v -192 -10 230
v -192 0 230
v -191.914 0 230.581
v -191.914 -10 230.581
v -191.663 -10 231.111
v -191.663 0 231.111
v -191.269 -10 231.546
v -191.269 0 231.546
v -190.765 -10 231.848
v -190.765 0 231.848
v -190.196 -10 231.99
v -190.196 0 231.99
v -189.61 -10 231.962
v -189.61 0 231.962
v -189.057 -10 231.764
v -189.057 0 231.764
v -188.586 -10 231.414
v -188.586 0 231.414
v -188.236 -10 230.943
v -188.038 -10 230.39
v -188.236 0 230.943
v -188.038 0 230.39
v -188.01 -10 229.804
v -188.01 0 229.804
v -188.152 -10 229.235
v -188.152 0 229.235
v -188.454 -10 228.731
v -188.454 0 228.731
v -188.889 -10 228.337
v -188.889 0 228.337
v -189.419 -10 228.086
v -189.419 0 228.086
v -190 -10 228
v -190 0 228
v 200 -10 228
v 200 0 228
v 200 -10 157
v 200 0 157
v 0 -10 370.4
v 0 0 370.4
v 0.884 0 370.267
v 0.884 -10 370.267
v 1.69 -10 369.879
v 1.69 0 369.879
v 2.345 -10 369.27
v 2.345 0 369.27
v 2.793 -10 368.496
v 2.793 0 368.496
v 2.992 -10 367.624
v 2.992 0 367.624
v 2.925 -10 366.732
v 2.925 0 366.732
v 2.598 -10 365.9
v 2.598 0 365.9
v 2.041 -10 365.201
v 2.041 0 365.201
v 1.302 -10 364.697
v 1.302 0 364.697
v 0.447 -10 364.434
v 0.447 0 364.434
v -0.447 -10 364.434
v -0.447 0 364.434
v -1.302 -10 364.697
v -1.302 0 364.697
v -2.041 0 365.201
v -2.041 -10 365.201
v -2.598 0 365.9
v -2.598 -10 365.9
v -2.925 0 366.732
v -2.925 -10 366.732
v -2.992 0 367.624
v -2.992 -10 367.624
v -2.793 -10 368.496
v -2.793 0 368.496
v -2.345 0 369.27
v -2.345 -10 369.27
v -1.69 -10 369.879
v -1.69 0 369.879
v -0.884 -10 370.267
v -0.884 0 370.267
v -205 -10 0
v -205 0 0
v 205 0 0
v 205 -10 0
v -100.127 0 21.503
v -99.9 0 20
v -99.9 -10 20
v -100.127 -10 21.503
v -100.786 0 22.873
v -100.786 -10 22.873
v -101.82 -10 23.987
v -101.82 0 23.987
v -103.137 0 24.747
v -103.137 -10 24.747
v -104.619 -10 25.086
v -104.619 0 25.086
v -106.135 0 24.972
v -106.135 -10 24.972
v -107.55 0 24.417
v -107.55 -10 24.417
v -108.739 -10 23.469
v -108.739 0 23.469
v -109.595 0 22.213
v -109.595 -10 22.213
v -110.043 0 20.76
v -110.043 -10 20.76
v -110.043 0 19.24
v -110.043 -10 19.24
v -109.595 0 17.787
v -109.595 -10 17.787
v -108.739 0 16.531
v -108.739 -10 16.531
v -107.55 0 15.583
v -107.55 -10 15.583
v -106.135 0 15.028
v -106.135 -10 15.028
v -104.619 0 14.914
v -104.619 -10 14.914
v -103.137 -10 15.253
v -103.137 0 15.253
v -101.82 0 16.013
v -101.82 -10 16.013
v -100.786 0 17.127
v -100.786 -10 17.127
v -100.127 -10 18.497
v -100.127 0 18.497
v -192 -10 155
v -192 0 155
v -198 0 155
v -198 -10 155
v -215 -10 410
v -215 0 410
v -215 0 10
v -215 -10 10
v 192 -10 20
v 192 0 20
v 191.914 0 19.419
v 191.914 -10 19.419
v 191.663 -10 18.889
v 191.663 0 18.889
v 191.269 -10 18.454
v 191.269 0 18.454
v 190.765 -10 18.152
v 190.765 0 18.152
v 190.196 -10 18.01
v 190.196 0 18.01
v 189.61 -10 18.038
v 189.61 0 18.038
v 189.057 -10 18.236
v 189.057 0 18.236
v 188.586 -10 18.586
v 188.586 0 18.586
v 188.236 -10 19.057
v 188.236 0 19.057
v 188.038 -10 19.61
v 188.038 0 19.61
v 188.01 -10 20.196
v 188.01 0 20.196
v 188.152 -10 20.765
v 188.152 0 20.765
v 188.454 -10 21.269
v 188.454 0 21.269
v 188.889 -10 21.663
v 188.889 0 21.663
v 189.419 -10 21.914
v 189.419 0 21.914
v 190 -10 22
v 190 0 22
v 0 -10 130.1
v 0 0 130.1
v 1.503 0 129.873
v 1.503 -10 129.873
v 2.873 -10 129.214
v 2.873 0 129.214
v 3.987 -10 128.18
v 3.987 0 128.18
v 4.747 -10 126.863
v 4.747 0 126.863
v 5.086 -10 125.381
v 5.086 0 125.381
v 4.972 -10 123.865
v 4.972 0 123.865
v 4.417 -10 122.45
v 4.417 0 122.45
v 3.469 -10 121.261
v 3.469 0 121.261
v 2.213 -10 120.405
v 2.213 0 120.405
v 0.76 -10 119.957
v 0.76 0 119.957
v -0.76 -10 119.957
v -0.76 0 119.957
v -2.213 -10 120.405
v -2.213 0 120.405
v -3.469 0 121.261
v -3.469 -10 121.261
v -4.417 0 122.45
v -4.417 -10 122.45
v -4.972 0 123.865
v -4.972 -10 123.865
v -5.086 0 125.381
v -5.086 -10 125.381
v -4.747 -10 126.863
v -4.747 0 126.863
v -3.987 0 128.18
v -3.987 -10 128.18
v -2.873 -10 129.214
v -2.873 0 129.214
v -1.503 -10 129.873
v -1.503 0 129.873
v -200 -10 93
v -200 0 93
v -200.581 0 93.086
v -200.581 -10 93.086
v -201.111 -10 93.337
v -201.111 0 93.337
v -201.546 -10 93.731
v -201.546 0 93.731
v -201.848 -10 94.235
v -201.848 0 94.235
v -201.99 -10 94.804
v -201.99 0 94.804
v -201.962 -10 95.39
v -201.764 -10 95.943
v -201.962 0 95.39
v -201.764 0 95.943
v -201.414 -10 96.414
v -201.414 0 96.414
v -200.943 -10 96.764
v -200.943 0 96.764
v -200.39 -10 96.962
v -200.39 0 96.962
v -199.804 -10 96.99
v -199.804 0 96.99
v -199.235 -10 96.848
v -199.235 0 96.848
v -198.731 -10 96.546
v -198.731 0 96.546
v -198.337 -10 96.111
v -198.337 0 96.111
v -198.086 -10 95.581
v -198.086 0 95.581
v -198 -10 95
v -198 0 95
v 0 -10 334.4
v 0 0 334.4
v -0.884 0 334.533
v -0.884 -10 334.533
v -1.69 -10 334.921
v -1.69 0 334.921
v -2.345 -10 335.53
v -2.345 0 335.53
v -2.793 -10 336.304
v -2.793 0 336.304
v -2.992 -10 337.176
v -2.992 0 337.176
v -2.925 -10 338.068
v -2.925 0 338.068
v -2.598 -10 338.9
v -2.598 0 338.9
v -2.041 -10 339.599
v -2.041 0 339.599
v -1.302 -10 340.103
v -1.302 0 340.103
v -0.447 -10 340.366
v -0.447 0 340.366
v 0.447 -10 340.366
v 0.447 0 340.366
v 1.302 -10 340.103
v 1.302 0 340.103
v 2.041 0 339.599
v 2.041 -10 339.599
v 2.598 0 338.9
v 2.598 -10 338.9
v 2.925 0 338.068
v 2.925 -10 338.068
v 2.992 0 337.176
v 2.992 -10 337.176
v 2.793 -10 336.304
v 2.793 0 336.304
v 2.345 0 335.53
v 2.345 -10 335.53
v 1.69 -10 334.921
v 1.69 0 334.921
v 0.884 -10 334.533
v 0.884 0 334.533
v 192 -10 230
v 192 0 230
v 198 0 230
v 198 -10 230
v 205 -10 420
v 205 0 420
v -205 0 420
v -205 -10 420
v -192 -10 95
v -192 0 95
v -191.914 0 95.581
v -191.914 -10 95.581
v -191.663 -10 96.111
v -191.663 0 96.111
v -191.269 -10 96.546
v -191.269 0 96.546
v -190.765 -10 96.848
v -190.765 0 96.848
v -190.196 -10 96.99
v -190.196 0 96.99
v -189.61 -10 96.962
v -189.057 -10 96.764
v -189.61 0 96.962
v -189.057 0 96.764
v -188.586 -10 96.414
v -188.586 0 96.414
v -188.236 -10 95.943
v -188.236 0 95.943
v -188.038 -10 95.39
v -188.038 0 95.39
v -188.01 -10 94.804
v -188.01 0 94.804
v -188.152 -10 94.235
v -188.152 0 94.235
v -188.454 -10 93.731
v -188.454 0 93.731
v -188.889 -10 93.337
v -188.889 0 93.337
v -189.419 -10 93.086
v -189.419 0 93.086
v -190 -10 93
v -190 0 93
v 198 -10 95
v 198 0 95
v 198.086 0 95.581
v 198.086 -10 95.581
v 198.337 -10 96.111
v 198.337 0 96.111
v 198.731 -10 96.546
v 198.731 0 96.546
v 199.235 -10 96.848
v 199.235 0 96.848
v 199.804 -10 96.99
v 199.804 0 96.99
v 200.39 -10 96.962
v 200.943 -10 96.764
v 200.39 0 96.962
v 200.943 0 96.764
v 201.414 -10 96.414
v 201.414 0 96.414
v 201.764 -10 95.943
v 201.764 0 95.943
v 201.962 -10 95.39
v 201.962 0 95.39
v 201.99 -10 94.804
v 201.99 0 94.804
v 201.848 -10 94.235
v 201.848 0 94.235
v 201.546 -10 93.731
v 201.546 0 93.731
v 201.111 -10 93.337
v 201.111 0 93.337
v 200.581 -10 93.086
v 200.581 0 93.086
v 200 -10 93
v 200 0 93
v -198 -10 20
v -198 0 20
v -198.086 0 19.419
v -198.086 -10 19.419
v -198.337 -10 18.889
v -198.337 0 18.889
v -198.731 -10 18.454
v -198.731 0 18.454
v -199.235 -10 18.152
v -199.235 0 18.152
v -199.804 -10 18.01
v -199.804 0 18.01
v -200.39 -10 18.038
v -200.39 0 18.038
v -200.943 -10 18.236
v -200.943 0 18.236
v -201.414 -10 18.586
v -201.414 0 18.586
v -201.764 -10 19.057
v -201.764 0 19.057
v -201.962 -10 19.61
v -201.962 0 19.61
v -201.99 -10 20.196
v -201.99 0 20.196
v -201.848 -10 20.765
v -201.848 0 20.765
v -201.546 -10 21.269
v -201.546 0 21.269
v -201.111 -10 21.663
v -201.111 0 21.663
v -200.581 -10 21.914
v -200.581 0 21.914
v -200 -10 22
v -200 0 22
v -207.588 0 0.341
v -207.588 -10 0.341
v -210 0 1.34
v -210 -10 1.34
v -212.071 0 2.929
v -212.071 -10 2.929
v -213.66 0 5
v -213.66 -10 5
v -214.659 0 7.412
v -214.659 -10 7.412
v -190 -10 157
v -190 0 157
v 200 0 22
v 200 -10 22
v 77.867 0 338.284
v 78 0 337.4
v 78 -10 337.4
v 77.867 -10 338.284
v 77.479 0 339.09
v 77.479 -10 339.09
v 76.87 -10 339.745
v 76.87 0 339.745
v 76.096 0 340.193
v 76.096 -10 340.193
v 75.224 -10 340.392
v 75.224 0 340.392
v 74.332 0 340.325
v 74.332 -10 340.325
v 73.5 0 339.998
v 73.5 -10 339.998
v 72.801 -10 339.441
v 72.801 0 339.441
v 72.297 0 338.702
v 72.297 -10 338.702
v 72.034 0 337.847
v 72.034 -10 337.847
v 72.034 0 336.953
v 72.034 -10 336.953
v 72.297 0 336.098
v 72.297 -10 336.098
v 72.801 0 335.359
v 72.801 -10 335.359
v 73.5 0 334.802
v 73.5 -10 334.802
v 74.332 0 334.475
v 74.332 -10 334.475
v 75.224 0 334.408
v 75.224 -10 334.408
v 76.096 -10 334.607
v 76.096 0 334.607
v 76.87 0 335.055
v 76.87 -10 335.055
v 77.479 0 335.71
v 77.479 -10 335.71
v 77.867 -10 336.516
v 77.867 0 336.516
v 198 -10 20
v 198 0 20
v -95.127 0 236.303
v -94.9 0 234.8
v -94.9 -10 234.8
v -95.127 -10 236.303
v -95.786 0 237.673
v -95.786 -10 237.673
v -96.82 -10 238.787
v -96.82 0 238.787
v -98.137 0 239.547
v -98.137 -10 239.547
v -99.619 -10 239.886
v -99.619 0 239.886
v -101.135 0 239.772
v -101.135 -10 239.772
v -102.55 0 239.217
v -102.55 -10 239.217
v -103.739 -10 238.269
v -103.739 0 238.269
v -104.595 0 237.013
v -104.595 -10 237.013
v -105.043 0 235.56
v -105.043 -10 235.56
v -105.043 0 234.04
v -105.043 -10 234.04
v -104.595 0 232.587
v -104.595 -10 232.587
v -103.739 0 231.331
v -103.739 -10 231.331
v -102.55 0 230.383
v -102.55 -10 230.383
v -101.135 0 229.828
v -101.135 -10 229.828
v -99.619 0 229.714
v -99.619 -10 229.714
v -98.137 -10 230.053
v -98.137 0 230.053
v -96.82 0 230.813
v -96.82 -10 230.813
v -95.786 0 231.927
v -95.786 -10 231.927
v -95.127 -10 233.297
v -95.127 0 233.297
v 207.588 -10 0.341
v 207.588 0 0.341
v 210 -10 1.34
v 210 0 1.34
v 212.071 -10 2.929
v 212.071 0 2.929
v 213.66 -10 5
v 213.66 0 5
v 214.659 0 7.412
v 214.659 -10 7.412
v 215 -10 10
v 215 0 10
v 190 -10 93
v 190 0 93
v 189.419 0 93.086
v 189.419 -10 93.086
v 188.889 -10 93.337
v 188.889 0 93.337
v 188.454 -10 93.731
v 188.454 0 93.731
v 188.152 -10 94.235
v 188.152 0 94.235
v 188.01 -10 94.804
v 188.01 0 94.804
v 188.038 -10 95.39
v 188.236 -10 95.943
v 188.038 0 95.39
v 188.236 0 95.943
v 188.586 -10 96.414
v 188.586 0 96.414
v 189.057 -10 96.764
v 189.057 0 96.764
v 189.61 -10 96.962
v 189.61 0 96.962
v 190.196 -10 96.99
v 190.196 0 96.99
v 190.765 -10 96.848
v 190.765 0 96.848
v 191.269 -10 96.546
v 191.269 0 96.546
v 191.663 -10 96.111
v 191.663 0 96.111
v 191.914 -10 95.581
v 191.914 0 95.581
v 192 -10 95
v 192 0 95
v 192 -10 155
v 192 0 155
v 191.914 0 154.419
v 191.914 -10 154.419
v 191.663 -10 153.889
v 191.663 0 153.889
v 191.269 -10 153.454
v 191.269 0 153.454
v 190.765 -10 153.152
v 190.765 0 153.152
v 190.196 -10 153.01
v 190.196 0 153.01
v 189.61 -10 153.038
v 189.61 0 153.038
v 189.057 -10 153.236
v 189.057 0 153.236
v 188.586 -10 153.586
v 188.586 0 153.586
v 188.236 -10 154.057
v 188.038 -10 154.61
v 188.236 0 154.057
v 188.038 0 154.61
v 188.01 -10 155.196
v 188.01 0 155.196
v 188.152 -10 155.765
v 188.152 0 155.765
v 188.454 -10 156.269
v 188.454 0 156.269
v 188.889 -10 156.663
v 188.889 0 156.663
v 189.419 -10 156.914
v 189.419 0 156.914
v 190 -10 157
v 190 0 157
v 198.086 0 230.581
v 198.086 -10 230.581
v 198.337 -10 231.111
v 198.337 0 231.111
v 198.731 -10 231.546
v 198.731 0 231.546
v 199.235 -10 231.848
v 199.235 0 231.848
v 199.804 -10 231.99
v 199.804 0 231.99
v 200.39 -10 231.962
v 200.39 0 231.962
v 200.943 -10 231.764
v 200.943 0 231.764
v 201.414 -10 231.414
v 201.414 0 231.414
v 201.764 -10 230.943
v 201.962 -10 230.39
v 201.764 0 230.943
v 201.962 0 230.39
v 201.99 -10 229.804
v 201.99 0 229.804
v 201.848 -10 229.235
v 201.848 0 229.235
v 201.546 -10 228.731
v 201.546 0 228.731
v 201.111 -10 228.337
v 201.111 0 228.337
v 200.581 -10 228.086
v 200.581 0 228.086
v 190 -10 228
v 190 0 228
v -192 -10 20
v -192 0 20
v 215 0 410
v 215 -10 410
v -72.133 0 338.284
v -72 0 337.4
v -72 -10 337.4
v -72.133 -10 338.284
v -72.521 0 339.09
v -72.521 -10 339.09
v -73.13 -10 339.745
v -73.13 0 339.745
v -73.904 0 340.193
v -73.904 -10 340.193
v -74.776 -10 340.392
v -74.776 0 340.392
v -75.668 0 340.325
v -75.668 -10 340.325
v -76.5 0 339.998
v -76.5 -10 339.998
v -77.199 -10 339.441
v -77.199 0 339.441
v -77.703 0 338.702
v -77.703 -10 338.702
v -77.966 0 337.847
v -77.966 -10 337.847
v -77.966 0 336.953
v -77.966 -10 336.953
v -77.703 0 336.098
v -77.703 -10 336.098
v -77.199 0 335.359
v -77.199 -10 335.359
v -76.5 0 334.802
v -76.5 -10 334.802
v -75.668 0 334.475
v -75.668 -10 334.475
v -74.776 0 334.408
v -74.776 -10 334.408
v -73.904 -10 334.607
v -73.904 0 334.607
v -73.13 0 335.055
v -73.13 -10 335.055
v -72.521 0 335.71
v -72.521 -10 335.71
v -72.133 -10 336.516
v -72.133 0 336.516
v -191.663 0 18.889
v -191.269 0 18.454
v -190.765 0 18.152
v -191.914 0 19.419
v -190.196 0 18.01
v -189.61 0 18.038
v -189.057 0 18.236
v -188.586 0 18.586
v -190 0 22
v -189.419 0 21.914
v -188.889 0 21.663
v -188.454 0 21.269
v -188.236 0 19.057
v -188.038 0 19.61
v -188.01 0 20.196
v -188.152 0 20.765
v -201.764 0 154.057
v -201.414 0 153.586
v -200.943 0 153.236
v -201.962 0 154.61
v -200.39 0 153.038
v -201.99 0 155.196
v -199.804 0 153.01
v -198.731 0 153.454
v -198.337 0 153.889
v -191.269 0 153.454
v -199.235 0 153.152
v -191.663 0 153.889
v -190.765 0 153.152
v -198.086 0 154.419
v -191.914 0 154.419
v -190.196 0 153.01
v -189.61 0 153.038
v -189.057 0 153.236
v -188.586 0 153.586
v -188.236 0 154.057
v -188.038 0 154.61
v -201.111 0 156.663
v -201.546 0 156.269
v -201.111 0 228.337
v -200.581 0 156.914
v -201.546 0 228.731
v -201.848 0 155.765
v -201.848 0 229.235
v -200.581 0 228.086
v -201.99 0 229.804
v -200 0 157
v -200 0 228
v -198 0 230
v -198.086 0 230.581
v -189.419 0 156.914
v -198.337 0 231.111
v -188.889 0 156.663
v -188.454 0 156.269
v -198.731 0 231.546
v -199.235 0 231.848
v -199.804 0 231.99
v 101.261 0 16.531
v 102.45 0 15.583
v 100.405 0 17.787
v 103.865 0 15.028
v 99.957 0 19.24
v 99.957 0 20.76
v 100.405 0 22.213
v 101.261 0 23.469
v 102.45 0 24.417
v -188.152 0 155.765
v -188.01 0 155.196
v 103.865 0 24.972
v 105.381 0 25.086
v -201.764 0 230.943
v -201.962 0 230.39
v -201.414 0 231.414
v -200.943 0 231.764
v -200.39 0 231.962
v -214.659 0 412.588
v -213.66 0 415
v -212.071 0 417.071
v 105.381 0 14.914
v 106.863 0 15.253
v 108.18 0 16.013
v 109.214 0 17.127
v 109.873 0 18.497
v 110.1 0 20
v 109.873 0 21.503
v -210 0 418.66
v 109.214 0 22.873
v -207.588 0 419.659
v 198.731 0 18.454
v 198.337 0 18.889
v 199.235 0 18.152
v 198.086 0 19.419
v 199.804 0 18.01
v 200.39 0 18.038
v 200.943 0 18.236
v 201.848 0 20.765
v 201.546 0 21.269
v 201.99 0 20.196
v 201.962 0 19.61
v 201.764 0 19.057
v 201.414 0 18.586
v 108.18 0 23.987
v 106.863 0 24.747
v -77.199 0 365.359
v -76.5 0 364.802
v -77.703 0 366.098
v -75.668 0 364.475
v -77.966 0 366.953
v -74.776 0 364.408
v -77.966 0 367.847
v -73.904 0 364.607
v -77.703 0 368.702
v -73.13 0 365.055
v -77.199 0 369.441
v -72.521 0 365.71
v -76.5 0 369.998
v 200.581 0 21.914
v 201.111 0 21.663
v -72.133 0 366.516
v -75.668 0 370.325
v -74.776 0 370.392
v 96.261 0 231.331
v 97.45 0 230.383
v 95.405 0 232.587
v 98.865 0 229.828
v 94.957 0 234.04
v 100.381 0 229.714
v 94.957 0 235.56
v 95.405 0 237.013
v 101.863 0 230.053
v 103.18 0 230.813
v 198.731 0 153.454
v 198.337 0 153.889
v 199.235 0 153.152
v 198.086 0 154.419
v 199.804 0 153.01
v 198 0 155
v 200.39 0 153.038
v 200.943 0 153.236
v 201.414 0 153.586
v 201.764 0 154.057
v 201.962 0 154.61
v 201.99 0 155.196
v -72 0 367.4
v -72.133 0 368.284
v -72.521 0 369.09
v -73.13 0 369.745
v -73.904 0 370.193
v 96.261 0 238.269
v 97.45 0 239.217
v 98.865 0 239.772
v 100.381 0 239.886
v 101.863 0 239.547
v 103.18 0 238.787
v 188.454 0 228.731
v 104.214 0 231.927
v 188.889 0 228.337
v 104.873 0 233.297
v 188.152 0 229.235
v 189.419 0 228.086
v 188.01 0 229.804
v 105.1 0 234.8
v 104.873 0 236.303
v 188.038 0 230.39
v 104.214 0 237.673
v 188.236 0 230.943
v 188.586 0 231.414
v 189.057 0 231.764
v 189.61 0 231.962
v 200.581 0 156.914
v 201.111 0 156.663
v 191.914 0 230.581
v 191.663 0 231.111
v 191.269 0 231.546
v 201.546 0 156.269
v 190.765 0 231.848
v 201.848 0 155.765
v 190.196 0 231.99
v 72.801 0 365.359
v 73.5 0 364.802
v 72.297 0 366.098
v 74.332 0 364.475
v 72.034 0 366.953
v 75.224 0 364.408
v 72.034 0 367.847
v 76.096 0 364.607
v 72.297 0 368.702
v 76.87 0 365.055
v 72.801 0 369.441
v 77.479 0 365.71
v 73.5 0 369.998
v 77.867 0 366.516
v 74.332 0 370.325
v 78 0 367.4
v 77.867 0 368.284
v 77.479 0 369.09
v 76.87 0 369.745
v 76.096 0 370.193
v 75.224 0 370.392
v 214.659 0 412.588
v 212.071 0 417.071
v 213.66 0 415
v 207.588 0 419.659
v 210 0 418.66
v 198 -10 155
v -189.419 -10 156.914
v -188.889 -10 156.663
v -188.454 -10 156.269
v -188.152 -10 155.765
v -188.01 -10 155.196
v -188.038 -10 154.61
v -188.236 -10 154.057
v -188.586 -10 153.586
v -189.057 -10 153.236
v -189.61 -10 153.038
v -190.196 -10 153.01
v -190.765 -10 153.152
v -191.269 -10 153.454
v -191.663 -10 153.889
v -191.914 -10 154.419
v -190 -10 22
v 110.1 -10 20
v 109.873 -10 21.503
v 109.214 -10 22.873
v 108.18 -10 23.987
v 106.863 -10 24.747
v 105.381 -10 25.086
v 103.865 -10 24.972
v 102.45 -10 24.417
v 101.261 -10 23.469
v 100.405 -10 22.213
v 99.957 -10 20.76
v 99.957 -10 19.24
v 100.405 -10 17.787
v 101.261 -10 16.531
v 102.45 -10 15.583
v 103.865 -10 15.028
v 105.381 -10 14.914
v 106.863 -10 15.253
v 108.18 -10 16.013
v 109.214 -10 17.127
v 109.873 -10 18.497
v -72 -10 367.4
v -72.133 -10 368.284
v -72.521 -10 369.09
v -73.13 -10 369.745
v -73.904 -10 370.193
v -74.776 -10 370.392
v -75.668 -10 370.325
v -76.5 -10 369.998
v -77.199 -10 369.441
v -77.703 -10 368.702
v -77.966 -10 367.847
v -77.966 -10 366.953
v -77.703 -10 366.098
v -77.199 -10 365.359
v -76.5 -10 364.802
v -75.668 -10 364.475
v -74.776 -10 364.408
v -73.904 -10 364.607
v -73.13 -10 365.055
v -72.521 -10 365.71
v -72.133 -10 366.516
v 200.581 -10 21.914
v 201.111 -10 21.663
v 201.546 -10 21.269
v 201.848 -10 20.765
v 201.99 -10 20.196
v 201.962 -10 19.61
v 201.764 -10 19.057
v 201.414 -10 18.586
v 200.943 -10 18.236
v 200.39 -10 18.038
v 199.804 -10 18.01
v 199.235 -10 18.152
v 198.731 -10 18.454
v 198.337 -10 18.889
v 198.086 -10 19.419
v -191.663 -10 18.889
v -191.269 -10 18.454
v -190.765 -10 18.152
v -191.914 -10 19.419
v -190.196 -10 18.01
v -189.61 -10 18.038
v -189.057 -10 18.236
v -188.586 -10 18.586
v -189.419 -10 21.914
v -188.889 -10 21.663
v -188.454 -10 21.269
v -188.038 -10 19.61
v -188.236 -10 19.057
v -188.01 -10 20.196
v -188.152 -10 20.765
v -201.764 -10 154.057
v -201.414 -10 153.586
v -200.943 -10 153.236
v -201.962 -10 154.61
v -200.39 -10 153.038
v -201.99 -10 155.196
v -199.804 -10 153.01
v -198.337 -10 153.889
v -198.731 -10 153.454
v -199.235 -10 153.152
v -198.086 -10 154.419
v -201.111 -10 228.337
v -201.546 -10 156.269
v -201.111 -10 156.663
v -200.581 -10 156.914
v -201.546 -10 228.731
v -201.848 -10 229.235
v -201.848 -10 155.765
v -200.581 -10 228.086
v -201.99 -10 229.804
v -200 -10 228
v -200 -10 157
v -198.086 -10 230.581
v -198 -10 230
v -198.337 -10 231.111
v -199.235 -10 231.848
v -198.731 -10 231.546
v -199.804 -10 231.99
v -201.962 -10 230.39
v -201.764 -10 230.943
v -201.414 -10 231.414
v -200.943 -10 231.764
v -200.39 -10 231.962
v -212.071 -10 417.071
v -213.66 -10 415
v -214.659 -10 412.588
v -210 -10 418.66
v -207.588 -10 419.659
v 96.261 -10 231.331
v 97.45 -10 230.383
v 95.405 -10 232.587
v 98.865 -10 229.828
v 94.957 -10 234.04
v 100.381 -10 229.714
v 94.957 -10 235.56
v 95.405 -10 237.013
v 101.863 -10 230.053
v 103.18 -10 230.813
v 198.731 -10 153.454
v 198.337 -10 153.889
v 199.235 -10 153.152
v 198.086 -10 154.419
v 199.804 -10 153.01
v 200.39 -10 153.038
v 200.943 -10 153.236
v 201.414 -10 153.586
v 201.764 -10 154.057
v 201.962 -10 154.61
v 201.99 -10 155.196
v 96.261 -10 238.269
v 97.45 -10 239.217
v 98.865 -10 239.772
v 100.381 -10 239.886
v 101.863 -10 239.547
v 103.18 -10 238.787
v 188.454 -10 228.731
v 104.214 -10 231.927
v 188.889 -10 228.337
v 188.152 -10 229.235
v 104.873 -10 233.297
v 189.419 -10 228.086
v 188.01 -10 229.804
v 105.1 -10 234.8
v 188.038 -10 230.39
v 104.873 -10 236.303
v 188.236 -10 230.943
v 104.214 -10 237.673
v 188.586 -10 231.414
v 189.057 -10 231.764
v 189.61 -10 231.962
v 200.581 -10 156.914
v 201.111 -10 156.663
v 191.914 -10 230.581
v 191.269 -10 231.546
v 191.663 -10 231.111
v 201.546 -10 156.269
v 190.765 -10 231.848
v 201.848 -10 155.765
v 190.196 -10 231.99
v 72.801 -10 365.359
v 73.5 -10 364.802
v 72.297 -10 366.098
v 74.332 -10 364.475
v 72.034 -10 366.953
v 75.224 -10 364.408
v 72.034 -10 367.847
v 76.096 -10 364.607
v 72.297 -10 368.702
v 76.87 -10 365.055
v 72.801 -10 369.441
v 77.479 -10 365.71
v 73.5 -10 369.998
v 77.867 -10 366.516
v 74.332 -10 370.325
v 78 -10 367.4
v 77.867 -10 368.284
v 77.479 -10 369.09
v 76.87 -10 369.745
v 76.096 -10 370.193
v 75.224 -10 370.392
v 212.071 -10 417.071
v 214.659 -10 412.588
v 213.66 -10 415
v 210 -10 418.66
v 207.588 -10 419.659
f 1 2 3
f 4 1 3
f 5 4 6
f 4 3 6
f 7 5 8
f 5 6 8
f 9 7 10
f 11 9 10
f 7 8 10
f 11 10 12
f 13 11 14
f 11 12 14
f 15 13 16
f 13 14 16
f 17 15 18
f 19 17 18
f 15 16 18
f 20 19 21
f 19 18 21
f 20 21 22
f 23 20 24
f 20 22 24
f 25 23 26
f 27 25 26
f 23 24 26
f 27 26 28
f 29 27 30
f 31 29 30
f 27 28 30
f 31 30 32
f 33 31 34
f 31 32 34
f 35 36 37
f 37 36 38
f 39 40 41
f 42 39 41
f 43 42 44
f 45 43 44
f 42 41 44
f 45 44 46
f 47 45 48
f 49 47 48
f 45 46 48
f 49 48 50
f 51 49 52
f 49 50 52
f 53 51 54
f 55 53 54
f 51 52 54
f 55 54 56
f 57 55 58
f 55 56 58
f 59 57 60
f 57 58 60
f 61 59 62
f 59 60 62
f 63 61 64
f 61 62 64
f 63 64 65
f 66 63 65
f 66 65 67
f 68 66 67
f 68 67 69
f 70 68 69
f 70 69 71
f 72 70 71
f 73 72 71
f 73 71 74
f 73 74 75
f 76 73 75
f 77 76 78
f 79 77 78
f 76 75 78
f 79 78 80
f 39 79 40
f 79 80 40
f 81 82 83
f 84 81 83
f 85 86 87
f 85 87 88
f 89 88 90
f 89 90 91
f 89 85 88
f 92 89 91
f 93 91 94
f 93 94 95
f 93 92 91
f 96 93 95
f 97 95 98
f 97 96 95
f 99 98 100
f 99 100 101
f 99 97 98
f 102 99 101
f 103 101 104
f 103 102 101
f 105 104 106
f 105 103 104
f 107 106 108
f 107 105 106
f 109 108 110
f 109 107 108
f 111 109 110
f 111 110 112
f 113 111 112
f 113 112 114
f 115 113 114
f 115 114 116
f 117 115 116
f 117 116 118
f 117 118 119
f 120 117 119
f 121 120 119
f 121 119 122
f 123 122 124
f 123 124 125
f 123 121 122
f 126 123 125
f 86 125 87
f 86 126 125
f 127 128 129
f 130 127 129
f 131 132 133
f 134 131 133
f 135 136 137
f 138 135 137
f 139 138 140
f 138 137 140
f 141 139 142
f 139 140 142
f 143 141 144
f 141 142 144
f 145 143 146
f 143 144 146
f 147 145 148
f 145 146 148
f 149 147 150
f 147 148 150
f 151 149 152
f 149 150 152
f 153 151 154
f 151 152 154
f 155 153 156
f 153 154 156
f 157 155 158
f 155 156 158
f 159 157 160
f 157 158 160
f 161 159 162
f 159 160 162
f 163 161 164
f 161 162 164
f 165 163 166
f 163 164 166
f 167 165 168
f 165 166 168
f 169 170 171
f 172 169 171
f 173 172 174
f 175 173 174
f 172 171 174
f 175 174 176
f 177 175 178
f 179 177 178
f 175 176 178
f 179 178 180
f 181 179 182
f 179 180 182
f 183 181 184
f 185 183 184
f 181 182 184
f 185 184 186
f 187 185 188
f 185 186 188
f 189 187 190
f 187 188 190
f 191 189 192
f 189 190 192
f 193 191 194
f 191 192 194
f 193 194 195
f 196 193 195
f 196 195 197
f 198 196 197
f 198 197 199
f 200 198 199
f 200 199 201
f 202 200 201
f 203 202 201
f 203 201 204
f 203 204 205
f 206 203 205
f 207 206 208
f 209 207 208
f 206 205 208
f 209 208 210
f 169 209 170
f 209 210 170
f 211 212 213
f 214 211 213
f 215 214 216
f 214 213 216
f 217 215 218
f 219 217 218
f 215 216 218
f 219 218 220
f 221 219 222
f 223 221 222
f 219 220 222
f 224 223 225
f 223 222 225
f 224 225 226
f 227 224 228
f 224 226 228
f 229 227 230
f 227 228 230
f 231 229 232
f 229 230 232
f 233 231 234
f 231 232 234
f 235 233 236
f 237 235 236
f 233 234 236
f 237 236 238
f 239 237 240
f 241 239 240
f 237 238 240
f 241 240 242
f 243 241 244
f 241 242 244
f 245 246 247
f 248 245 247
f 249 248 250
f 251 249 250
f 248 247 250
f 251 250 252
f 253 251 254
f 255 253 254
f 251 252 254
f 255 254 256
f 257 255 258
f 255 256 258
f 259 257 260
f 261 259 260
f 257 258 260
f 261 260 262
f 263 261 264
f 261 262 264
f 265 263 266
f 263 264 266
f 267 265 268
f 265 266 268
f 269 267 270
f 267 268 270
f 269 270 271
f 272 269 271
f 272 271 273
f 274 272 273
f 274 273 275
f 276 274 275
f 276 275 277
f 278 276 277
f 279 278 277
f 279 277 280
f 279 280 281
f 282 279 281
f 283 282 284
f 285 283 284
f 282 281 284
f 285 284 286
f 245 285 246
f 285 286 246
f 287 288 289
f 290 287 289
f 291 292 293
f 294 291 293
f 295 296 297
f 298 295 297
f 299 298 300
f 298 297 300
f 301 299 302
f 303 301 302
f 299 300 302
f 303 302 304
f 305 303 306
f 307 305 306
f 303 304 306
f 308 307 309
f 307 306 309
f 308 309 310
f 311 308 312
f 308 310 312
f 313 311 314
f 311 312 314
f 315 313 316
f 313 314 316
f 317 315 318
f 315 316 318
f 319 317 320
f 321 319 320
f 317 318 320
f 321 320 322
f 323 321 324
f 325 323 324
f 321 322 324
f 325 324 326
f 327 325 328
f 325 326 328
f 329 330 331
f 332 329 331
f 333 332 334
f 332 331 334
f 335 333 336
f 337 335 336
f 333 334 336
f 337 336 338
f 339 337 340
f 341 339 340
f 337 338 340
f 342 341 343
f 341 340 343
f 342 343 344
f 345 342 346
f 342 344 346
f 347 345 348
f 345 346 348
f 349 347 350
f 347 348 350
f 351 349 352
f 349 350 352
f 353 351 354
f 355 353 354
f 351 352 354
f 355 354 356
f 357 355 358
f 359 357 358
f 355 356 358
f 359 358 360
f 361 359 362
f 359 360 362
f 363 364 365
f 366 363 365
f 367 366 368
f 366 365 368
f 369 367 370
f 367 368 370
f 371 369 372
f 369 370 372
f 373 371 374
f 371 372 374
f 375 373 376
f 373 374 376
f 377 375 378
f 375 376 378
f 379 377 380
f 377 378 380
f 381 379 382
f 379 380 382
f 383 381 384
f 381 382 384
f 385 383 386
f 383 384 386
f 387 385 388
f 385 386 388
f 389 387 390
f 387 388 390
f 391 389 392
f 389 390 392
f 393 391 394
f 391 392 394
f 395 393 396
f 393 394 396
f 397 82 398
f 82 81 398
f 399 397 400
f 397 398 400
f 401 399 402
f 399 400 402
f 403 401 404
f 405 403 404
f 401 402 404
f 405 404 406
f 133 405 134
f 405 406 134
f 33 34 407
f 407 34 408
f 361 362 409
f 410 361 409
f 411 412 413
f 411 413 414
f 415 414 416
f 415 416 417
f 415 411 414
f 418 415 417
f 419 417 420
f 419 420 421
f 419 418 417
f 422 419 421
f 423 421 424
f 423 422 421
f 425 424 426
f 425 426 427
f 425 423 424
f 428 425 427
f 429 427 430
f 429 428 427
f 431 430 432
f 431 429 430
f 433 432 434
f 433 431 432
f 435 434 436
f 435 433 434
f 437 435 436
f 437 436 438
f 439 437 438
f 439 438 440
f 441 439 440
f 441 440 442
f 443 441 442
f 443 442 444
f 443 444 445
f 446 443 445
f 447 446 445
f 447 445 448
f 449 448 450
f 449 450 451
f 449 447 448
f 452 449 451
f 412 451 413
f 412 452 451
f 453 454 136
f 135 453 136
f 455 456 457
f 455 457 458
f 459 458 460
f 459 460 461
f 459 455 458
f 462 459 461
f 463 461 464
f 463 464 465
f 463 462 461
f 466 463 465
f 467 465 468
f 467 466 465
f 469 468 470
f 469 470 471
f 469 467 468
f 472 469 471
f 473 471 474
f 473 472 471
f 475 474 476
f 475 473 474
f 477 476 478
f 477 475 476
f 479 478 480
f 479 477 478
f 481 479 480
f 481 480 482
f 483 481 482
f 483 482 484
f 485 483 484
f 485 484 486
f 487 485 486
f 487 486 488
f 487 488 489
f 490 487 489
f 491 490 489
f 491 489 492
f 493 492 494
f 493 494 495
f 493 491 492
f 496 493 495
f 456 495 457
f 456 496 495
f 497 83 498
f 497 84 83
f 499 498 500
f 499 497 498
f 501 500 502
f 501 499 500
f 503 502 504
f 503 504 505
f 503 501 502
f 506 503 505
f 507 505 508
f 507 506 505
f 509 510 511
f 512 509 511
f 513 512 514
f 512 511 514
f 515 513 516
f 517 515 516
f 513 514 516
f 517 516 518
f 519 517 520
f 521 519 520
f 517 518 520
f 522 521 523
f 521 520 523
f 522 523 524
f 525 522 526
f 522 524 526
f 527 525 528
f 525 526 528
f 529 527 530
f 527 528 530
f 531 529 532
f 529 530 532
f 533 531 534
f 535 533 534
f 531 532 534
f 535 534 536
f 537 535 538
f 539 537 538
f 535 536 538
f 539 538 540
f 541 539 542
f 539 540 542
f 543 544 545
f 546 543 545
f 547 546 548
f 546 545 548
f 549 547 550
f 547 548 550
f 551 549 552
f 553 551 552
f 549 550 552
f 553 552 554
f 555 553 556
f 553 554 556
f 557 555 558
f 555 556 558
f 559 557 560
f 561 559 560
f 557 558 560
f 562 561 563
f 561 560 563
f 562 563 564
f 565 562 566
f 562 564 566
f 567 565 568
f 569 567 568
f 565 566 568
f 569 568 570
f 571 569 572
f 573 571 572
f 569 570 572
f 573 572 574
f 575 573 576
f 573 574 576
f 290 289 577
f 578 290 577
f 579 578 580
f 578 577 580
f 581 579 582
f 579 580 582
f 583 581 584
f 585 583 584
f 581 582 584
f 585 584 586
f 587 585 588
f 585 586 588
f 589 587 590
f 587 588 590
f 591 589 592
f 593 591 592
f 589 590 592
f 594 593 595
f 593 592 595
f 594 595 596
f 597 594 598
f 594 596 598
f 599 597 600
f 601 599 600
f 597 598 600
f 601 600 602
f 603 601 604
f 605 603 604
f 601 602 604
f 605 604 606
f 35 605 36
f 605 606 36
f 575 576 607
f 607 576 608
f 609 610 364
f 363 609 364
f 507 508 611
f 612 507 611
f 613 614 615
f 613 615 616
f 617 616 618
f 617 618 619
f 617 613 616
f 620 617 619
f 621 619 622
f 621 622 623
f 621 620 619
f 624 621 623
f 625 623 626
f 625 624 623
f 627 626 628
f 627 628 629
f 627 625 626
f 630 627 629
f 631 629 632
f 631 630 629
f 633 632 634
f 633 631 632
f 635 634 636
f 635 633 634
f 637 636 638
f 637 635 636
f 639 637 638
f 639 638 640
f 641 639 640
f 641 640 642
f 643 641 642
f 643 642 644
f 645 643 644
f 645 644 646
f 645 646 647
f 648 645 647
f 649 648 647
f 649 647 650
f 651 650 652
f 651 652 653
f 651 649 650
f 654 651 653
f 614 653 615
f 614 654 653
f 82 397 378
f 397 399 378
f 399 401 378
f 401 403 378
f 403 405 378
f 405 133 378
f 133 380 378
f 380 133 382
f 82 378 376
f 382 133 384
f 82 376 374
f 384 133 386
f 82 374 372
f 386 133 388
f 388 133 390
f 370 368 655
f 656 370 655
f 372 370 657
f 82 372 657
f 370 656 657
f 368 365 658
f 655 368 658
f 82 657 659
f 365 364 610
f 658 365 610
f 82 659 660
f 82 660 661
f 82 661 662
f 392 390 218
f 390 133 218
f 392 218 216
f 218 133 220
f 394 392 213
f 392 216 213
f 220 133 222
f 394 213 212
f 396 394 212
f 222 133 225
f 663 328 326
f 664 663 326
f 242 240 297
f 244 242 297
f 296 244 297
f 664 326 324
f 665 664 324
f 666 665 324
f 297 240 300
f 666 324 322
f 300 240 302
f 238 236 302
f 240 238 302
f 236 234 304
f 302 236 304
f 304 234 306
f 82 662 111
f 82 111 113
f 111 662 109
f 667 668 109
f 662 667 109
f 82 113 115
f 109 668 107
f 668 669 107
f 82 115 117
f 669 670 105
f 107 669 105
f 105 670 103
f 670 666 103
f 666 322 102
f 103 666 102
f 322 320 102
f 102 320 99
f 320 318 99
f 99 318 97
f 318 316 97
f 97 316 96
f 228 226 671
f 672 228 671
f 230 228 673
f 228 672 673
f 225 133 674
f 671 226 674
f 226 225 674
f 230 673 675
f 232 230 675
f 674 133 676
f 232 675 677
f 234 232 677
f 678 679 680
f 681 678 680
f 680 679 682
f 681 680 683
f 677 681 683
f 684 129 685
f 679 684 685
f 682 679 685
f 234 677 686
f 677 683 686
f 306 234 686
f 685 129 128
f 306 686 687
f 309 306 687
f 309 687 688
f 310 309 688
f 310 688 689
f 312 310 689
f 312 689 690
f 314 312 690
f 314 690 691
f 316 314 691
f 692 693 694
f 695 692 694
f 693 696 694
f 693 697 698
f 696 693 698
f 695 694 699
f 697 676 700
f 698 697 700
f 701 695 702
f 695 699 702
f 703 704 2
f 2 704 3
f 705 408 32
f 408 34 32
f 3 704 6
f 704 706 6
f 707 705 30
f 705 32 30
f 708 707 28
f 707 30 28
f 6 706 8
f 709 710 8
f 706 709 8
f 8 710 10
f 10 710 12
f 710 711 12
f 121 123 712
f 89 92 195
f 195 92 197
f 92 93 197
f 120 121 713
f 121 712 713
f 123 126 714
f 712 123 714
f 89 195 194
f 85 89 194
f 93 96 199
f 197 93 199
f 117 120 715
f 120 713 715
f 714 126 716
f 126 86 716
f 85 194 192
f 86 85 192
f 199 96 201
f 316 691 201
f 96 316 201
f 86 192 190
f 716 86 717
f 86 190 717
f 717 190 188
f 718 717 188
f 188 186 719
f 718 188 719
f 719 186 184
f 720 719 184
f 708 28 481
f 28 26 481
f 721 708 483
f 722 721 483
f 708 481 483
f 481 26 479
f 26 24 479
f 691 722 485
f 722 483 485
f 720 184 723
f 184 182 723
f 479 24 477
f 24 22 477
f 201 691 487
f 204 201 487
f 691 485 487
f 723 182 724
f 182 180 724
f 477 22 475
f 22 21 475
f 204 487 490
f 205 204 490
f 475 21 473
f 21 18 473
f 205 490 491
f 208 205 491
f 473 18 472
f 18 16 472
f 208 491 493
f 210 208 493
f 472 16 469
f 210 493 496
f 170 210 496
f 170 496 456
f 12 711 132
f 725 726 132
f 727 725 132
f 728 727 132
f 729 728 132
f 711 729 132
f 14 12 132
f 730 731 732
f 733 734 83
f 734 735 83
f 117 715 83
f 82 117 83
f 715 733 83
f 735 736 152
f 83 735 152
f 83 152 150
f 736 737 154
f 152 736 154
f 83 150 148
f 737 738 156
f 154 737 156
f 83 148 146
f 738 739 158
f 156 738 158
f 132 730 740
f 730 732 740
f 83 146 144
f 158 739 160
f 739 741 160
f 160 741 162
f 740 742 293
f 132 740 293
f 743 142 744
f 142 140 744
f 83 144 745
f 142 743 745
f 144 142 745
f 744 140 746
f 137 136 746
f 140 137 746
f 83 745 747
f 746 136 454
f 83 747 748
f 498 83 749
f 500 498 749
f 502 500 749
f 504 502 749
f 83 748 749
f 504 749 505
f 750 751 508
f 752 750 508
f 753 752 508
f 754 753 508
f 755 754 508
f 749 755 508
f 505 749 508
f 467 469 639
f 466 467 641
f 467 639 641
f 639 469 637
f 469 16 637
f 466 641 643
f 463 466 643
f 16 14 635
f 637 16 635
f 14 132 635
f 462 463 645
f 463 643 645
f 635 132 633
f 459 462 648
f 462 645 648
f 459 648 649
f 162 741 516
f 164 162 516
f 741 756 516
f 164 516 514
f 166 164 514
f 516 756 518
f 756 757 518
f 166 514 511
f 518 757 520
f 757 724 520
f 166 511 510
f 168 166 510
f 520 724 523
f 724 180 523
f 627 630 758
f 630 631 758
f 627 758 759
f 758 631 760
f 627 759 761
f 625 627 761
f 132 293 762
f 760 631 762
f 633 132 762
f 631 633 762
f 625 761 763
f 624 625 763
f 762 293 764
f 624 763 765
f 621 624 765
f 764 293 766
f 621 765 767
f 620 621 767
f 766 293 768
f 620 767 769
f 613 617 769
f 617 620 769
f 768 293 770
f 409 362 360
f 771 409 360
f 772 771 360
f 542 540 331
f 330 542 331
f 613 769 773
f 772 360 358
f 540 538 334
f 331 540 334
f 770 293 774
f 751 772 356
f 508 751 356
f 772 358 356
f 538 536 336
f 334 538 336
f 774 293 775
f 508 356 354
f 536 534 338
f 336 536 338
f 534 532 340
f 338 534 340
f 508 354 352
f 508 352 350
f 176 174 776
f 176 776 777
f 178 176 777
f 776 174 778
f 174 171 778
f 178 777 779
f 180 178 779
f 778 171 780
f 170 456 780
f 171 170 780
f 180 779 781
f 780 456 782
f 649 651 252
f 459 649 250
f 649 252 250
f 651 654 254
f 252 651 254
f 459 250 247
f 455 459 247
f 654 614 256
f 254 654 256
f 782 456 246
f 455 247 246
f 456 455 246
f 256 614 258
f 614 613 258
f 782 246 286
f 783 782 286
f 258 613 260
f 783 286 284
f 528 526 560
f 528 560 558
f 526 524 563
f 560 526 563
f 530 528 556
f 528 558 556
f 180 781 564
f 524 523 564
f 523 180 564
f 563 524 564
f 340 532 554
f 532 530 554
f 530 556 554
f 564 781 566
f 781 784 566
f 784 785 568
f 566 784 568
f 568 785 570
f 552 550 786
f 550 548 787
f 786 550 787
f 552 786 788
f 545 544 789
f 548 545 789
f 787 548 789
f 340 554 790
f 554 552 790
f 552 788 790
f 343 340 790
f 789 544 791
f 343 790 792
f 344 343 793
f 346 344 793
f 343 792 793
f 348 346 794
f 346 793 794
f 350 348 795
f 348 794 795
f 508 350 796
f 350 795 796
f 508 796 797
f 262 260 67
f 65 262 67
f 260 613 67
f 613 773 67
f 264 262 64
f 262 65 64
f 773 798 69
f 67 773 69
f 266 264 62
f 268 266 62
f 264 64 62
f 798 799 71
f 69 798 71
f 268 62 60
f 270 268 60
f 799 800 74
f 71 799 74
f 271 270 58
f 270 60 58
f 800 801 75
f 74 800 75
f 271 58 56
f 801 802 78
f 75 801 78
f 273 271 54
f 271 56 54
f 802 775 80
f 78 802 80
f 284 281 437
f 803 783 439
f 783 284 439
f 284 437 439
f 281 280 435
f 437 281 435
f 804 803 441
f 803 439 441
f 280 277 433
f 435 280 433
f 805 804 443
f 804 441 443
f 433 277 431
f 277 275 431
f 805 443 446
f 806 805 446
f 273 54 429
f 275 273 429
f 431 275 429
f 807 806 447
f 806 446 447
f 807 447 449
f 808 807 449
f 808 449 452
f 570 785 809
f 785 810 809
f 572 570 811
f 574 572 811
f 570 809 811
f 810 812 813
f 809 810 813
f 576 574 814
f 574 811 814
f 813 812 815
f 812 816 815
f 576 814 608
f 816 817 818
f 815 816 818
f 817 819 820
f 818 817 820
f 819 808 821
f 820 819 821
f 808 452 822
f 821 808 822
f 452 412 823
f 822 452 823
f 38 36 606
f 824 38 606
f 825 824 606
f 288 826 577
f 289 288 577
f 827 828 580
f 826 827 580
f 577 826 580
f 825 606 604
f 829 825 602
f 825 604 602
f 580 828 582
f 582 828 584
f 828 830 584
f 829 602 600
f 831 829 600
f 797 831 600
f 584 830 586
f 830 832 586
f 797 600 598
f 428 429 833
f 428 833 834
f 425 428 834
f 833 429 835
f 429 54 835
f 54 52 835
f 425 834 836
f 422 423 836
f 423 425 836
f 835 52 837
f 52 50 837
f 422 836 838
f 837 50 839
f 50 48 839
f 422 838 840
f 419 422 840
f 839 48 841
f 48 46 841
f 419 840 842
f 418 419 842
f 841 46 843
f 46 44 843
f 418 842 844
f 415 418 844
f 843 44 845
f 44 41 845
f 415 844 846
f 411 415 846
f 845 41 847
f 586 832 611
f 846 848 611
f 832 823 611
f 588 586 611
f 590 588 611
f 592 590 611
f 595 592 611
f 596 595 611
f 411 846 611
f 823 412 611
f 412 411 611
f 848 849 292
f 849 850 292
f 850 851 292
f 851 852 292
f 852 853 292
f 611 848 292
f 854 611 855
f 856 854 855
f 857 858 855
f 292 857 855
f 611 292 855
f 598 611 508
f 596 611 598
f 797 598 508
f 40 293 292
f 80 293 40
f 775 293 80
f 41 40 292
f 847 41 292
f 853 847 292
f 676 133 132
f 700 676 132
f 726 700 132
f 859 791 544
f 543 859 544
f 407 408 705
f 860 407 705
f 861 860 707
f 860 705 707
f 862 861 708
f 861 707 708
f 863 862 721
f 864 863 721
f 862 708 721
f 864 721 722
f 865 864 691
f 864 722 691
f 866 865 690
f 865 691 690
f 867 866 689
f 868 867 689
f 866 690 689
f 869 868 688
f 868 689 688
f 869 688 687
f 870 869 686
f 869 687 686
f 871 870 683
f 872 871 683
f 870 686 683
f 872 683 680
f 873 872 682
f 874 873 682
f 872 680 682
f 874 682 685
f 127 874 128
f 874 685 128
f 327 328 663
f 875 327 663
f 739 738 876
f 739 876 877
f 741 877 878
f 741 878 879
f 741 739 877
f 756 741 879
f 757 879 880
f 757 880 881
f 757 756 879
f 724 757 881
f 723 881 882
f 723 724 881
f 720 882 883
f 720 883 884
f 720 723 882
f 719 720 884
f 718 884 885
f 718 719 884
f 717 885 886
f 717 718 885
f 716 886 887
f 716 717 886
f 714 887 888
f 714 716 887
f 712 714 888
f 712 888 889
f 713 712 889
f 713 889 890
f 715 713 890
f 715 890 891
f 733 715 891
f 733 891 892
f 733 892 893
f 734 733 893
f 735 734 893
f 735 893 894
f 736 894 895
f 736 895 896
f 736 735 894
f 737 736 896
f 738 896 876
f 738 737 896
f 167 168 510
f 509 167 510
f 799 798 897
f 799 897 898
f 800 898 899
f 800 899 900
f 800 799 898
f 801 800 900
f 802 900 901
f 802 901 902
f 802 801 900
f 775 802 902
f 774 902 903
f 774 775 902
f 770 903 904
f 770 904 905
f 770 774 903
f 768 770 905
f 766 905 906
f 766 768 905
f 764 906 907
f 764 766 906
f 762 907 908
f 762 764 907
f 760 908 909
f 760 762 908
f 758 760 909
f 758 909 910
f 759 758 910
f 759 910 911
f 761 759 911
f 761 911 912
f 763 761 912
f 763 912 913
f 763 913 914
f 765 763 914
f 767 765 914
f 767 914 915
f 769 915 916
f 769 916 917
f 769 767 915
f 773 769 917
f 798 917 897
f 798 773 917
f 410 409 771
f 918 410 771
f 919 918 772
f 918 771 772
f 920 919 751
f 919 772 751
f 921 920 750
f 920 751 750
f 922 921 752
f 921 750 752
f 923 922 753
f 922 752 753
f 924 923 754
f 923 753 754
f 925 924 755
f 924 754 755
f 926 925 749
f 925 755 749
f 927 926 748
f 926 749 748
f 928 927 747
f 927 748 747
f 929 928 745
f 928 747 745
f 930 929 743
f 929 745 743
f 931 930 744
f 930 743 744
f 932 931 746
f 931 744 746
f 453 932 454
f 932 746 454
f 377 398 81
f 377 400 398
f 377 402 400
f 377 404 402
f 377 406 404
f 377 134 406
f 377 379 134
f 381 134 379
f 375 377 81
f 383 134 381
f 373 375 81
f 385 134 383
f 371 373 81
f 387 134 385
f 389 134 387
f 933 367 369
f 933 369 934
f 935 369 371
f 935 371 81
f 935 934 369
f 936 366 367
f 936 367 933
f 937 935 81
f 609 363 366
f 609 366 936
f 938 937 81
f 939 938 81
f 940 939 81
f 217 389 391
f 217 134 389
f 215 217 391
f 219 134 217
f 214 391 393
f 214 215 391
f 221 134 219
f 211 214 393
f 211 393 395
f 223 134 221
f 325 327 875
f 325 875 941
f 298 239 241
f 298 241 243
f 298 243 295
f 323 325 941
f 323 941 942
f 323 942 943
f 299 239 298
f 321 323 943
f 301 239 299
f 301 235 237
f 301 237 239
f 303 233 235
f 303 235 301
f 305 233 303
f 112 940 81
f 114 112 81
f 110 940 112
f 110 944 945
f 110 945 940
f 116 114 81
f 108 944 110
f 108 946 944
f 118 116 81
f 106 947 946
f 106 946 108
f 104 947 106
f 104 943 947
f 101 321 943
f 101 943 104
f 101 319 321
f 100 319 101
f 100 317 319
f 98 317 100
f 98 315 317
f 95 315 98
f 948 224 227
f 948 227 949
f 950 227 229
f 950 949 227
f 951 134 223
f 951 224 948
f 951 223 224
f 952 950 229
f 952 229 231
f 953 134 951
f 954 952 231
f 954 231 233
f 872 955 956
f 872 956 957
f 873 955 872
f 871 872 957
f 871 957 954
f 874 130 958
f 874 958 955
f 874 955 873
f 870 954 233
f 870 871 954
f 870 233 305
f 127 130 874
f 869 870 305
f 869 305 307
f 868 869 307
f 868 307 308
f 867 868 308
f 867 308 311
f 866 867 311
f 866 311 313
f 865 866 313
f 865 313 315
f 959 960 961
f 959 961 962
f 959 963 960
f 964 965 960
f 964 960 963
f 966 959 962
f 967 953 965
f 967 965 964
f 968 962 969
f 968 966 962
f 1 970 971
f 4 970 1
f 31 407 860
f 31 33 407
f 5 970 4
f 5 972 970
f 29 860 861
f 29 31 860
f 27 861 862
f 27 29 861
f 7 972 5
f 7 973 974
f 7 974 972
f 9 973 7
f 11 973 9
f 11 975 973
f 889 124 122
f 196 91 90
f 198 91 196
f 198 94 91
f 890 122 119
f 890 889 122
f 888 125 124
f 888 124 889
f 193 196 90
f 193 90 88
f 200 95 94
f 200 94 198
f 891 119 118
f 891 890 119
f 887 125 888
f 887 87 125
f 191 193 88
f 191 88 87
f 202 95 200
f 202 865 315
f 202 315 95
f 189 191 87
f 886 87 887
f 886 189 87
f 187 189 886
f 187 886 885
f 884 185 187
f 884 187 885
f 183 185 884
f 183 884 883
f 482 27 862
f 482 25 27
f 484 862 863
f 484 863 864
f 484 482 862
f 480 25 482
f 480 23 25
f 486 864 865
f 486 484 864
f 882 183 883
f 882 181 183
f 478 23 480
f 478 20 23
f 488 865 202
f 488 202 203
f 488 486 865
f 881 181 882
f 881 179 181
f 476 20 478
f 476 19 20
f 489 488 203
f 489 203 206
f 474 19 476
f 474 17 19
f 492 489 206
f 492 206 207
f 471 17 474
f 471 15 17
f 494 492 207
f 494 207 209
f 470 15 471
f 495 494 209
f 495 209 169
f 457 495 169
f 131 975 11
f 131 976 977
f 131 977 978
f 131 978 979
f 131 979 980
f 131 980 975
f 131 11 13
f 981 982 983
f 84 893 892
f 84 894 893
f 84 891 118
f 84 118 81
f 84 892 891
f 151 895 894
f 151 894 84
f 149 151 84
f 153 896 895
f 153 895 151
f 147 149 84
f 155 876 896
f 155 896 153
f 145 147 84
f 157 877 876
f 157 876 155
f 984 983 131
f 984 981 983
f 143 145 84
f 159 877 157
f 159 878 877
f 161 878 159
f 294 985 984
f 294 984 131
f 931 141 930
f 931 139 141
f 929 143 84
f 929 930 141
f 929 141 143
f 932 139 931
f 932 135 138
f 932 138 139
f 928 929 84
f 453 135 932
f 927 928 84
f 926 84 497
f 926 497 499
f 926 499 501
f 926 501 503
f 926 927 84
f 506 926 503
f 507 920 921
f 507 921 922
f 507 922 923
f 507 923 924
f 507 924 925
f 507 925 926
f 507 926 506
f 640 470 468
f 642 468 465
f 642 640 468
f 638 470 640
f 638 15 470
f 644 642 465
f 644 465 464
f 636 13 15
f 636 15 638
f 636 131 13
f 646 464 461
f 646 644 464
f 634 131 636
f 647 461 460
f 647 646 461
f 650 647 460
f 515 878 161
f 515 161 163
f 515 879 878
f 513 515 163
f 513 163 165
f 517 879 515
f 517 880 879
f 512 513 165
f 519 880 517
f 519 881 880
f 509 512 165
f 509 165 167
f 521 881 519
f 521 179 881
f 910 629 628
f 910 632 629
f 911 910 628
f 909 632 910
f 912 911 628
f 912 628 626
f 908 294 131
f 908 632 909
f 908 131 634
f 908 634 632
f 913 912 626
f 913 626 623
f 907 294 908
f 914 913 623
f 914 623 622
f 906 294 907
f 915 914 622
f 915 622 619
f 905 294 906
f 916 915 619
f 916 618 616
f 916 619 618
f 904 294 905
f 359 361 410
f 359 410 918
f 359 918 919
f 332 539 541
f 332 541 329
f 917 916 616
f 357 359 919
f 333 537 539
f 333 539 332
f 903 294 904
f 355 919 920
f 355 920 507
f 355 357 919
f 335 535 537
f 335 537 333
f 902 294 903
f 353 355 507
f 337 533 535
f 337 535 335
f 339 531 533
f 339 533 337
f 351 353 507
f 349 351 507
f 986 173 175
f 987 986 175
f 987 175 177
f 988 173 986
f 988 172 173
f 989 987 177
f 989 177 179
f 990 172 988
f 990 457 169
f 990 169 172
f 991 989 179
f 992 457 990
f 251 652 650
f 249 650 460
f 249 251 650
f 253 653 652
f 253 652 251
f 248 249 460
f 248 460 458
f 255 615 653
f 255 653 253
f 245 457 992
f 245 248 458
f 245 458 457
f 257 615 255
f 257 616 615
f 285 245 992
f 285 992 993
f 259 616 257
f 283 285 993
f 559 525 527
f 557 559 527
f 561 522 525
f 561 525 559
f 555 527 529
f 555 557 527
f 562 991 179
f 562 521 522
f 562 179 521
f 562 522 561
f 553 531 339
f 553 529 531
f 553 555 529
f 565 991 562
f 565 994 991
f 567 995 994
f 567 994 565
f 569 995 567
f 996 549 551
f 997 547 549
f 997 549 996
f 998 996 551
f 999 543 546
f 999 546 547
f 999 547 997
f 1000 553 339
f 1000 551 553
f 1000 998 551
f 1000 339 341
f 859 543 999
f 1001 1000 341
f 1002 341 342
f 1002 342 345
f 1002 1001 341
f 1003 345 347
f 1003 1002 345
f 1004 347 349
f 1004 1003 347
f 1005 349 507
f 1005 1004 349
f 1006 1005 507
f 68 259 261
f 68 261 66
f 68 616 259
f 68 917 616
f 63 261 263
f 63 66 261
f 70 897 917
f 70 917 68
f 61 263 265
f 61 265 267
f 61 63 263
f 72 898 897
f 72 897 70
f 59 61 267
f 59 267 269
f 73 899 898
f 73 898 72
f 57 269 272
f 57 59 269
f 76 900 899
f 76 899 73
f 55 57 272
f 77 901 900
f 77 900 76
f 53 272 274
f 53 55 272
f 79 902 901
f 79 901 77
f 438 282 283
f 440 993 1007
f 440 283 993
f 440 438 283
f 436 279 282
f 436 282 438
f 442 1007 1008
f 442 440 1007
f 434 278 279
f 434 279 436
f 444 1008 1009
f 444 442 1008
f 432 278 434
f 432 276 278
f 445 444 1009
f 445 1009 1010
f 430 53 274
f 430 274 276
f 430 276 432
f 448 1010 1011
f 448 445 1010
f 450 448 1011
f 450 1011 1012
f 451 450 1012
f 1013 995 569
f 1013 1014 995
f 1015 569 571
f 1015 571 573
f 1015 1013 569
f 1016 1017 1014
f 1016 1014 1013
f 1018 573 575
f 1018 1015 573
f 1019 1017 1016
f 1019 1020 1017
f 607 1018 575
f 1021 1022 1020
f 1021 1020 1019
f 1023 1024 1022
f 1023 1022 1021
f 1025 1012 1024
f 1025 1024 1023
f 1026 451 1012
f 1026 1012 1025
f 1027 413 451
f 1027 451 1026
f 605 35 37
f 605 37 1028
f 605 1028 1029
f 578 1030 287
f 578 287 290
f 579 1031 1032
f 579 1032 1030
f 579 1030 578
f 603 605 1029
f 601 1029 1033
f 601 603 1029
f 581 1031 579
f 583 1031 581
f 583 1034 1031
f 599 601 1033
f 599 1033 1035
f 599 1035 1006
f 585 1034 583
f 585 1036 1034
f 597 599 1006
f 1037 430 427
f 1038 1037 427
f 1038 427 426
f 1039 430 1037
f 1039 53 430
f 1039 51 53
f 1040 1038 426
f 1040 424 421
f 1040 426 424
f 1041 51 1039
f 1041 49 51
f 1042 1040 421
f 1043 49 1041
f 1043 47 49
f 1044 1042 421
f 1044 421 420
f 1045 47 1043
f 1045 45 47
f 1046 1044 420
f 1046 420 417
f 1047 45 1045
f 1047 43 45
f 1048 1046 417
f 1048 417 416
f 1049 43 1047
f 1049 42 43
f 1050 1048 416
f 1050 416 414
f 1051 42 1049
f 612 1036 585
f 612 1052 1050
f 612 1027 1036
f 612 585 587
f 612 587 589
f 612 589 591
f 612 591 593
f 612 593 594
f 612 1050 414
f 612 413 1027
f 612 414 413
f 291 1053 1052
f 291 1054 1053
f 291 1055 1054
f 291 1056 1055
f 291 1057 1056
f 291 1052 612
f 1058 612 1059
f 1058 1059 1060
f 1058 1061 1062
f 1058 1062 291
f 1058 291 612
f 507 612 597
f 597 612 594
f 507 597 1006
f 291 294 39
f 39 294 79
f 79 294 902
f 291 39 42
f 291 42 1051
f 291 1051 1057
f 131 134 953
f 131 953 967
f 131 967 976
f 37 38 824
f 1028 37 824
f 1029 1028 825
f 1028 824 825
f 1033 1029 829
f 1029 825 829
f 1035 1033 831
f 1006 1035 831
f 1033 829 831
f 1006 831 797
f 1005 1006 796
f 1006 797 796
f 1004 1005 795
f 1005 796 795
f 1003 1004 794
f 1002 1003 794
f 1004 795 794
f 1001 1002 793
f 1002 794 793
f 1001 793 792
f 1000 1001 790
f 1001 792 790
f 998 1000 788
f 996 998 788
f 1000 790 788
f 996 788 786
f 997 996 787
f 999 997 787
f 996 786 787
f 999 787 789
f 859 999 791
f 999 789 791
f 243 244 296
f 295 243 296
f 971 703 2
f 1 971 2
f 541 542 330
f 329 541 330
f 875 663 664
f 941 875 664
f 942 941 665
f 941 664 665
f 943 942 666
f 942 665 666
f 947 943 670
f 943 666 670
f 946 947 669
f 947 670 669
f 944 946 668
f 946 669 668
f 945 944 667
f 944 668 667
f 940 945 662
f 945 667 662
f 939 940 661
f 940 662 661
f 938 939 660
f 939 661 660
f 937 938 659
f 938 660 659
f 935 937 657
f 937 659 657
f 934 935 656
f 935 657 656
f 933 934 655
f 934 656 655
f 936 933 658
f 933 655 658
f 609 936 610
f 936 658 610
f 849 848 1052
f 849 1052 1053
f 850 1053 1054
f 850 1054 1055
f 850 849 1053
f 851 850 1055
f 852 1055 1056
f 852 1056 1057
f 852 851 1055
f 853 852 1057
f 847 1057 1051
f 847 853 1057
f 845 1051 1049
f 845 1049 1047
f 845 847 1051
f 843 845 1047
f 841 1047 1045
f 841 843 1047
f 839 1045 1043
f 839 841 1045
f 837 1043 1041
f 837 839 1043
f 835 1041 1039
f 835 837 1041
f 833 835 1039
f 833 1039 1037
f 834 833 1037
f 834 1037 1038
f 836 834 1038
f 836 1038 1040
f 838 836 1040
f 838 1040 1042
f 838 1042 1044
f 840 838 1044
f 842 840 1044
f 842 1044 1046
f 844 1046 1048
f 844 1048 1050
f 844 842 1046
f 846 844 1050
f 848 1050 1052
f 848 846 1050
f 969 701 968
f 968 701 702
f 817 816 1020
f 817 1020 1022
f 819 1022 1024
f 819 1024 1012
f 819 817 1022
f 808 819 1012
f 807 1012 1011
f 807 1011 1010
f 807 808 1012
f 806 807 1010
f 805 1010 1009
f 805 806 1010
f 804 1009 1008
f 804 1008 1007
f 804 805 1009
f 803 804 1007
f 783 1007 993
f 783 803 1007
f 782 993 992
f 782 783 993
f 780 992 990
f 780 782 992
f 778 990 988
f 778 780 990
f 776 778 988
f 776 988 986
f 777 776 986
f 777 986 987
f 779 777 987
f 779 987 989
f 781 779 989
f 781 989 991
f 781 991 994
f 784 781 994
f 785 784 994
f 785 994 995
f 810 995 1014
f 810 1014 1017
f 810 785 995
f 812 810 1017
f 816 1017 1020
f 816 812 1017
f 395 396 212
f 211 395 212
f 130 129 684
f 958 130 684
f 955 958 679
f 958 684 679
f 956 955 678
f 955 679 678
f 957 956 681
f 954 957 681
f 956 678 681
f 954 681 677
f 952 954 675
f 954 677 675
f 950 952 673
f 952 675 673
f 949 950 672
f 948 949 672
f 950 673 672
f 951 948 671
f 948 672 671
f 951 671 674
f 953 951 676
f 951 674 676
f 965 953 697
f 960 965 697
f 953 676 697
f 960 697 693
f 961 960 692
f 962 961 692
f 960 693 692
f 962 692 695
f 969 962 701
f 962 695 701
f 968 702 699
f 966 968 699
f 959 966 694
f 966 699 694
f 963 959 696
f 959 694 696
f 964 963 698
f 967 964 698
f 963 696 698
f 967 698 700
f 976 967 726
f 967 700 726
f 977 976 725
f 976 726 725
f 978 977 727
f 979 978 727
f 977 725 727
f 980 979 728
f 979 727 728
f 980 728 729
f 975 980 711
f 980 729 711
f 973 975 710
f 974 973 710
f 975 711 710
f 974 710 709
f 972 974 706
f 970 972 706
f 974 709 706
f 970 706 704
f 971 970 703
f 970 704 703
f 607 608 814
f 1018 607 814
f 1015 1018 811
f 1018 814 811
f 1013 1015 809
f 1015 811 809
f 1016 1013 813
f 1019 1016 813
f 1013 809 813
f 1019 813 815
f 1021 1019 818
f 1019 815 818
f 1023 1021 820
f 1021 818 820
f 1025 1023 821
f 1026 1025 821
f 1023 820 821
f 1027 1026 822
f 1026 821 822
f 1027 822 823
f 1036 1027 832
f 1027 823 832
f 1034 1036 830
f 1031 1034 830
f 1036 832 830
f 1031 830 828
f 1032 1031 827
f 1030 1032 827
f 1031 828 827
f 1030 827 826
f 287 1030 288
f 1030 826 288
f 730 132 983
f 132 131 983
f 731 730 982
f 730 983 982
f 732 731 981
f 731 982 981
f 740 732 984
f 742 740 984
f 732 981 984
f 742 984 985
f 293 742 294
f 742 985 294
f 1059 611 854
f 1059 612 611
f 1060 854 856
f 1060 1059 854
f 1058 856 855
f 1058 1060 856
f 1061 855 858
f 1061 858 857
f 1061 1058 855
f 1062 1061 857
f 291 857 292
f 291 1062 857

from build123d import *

# Parameters (mm, degrees)
F0_R     = 5.1
F0_R_2   = 3
F1_DEPTH = 10
F2_R     = 10


with BuildPart() as f1:
    # F0 (on Front) → F1 (new body)
    with BuildSketch(Plane.XZ):
        Polygon((-215, 0), (0, 0), (215, 0), (215, 420), (0, 420), (-215, 420), align=None)
        with BuildLine():
            ThreePointArc((-198, 20), (-201.414214, 18.585786), (-200, 22))
            Line((-200, 22), (-200, 93))
            ThreePointArc((-200, 93), (-201.414214, 96.414214), (-198, 95))
            Line((-198, 95), (-192, 95))
            ThreePointArc((-192, 95), (-188.585786, 96.414214), (-190, 93))
            Line((-190, 93), (-190, 22))
            ThreePointArc((-190, 22), (-188.585786, 18.585786), (-192, 20))
            Line((-192, 20), (-198, 20))
        make_face(mode=Mode.SUBTRACT)
        with Locations((-105, 20)):
            Circle(F0_R, mode=Mode.SUBTRACT)
        with BuildLine():
            Line((-192, 155), (-198, 155))
            ThreePointArc((-198, 155), (-201.414214, 153.585786), (-200, 157))
            Line((-200, 157), (-200, 228))
            ThreePointArc((-200, 228), (-201.414214, 231.414214), (-198, 230))
            Line((-198, 230), (-192, 230))
            ThreePointArc((-192, 230), (-188.585786, 231.414214), (-190, 228))
            Line((-190, 228), (-190, 157))
            ThreePointArc((-190, 157), (-188.585786, 153.585786), (-192, 155))
        make_face(mode=Mode.SUBTRACT)
        with Locations((105, 20)):
            Circle(F0_R, mode=Mode.SUBTRACT)
        with BuildLine():
            ThreePointArc((190, 93), (188.585786, 96.414214), (192, 95))
            Line((192, 95), (198, 95))
            ThreePointArc((198, 95), (201.414214, 96.414214), (200, 93))
            Line((200, 93), (200, 22))
            ThreePointArc((200, 22), (201.414214, 18.585786), (198, 20))
            Line((198, 20), (192, 20))
            ThreePointArc((192, 20), (188.585786, 18.585786), (190, 22))
            Line((190, 22), (190, 93))
        make_face(mode=Mode.SUBTRACT)
        with BuildLine():
            ThreePointArc((0, 119.9), (-5.1, 125), (0, 130.1))
            ThreePointArc((0, 130.1), (5.1, 125), (0, 119.9))
        make_face(mode=Mode.SUBTRACT)
        with BuildLine():
            Line((198, 155), (192, 155))
            ThreePointArc((192, 155), (188.585786, 153.585786), (190, 157))
            Line((190, 157), (190, 228))
            ThreePointArc((190, 228), (188.585786, 231.414214), (192, 230))
            Line((192, 230), (198, 230))
            ThreePointArc((198, 230), (201.414214, 231.414214), (200, 228))
            Line((200, 228), (200, 157))
            ThreePointArc((200, 157), (201.414214, 153.585786), (198, 155))
        make_face(mode=Mode.SUBTRACT)
        with Locations((-100, 234.8)):
            Circle(F0_R, mode=Mode.SUBTRACT)
        with Locations((-75, 337.4)):
            Circle(F0_R_2, mode=Mode.SUBTRACT)
        with Locations((-75, 367.4)):
            Circle(F0_R_2, mode=Mode.SUBTRACT)
        with Locations((100, 234.8)):
            Circle(F0_R, mode=Mode.SUBTRACT)
        with BuildLine():
            ThreePointArc((0, 340.4), (3, 337.4), (0, 334.4))
            ThreePointArc((0, 334.4), (-3, 337.4), (0, 340.4))
        make_face(mode=Mode.SUBTRACT)
        with BuildLine():
            ThreePointArc((0, 364.4), (-3, 367.4), (0, 370.4))
            ThreePointArc((0, 370.4), (3, 367.4), (0, 364.4))
        make_face(mode=Mode.SUBTRACT)
        with Locations((75, 337.4)):
            Circle(F0_R_2, mode=Mode.SUBTRACT)
        with Locations((75, 367.4)):
            Circle(F0_R_2, mode=Mode.SUBTRACT)
    extrude(amount=F1_DEPTH)

    # F2
    f2_edges = [f1.edges().sort_by_distance(p)[0] for p in [
        (215, -5, 0),
        (215, -5, 420),
        (-215, -5, 420),
        (-215, -5, 0),
    ]]
    fillet(f2_edges, radius=F2_R)


solid = f1.part
